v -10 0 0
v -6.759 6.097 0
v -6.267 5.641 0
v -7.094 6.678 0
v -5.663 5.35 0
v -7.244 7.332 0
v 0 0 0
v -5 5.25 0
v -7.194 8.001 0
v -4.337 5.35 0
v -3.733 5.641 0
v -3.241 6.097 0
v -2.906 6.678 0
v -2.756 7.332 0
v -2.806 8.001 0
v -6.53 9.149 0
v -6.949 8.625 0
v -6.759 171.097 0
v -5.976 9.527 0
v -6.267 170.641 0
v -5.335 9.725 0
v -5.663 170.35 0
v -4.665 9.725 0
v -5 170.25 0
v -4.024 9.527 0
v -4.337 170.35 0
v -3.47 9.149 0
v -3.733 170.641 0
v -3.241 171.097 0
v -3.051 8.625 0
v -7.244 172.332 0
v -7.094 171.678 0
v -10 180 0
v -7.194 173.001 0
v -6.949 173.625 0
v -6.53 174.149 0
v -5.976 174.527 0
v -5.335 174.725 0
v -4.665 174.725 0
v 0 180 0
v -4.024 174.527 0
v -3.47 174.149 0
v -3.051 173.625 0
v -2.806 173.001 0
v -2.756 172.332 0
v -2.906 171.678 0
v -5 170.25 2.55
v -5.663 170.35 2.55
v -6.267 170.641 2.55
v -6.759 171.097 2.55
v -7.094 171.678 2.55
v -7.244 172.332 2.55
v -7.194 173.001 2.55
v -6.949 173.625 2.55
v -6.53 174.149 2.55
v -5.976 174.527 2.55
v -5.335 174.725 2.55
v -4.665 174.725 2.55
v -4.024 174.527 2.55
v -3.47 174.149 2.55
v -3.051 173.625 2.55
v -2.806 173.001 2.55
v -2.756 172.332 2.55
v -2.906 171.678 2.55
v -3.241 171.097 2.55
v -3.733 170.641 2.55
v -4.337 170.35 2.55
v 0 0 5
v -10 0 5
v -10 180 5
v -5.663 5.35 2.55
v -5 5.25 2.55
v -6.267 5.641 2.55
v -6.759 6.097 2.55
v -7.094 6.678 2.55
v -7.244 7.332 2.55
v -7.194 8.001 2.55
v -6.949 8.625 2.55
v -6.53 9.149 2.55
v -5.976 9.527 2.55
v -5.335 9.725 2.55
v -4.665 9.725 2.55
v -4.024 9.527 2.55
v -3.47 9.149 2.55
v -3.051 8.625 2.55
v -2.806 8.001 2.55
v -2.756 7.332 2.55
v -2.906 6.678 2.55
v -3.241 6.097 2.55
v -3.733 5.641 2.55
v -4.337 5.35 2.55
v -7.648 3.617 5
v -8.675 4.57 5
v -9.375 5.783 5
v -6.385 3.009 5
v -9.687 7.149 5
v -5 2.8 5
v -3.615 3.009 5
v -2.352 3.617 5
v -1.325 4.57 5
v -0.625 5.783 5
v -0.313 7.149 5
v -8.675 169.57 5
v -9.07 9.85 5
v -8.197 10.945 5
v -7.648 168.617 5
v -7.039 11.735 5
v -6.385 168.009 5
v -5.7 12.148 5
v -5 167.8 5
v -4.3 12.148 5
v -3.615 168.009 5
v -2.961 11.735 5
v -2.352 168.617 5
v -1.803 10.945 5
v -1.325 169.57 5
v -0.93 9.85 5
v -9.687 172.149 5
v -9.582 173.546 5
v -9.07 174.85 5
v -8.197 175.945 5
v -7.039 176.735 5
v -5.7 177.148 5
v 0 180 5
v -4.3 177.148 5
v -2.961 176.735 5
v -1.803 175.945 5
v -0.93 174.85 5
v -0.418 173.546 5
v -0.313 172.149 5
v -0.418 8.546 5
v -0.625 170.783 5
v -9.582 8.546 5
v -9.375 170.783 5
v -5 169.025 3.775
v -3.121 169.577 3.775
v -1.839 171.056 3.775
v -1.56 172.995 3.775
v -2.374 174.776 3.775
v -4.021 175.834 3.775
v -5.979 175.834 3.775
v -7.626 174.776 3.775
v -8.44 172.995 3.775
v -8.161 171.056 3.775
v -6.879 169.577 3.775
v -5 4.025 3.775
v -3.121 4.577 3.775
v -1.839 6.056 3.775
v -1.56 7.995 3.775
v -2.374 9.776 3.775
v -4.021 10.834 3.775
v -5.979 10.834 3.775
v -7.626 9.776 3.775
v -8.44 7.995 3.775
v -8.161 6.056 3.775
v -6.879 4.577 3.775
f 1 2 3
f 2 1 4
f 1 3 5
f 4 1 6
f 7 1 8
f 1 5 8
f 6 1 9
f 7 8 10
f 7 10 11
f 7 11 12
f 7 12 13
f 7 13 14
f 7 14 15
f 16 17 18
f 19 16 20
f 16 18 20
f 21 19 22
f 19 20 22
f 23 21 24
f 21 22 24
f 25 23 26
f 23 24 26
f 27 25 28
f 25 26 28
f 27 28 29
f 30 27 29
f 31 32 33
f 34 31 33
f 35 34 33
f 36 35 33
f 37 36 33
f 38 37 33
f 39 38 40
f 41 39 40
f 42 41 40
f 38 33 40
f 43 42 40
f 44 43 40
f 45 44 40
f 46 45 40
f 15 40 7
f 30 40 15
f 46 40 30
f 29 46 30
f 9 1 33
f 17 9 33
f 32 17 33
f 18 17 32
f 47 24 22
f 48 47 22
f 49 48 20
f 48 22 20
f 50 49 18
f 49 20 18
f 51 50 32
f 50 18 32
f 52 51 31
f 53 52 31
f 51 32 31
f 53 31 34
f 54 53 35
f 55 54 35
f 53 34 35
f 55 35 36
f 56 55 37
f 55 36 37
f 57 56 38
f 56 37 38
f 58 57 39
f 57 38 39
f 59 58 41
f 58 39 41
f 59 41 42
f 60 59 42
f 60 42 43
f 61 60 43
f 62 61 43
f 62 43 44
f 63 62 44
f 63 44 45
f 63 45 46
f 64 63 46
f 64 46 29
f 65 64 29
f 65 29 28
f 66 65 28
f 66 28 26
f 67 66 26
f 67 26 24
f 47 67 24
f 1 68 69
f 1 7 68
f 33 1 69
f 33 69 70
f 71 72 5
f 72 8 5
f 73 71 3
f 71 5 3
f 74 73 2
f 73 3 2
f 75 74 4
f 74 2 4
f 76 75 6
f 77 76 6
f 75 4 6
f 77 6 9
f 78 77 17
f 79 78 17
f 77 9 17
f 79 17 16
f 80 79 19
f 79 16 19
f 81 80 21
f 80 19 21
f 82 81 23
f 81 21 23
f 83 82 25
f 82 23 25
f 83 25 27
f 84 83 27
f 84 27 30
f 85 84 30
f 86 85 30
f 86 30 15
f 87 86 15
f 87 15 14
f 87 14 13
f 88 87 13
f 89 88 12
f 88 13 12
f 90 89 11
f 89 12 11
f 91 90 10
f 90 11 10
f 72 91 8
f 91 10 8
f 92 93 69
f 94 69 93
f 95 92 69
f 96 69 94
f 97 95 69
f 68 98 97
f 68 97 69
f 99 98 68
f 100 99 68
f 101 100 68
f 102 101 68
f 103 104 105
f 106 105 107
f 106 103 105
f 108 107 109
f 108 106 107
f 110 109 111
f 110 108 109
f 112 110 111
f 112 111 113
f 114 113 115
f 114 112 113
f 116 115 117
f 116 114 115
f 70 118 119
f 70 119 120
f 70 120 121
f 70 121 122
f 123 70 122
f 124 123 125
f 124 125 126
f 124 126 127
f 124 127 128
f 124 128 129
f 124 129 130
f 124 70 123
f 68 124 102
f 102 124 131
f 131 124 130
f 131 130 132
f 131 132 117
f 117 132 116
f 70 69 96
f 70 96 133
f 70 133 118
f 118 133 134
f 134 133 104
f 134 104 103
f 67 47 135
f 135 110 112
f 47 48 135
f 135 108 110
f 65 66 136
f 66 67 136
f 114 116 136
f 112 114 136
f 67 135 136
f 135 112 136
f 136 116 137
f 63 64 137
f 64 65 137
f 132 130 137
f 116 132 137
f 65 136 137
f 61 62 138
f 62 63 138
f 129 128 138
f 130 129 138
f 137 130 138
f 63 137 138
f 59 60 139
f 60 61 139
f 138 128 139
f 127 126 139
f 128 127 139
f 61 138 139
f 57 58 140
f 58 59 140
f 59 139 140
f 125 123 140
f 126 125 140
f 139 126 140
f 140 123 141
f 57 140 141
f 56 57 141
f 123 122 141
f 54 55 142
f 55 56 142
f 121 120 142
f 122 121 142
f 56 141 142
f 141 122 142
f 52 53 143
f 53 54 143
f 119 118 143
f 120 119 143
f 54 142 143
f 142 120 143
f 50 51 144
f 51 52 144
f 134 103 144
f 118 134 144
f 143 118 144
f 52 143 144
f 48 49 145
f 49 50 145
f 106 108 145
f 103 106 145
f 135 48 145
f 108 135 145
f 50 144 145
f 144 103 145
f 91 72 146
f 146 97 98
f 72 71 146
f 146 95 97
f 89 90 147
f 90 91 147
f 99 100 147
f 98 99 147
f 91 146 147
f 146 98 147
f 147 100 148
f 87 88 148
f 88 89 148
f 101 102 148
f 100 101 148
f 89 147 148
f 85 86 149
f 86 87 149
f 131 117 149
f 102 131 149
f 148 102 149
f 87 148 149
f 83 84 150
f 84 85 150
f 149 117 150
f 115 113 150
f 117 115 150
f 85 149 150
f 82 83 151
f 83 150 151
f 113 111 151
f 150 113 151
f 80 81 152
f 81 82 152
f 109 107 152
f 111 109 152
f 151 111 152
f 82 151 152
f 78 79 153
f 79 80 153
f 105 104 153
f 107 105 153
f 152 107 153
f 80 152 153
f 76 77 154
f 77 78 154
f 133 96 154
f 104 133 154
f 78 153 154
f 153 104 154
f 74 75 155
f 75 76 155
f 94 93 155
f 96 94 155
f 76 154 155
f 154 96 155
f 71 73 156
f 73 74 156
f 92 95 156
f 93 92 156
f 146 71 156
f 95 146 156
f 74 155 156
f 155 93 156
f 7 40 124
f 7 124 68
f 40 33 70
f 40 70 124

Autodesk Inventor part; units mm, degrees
ref_plane "YZ Plane" through (0, 0, 0) normal (1, 0, 0) x (0, 1, 0)
ref_plane "XZ Plane" through (0, 0, 0) normal (0, 1, 0) x (-1, 0, 0)
ref_plane "XY Plane" through (0, 0, 0) normal (0, 0, 1) x (1, 0, 0)
sketch "Sketch1" plane through (0, 0, 0) normal (0, 0, 1) x (1, 0, 0)
  line L0 (0, 0) -> (-10, 0)
  line L1 (-10, 0) -> (-10, 180)
  line L2 (-10, 180) -> (0, 180)
  line L3 (0, 180) -> (0, 0)
  dimension "d0" = 10
  dimension "d1" = 180
extrude "Extrusion1" add sketch "Sketch1" along normal blind 5
sketch "Sketch2" plane through (0, 0, 5) normal (0, 0, 1) x (1, 0, 0)
  line L0 (0, 180) -> (-10, 180) projected
  line L1 (-10, 0) -> (0, 0) projected
  line L2 (-10, 180) -> (-10, 0) projected
  line L3 (0, 0) -> (0, 180) projected
  point P0 (-5, 172.5)
  point P1 (-5, 7.5)
  dimension "d4" = 7.5
  dimension "d5" = 7.5
  dimension "d8" = 5
  dimension "d9" = 5
hole "Hole1" at (-5, 172.5, 5) at (-5, 7.5, 5) direction (0, 0, -1) diameter 4.5 end through all countersink diameter 9.4 countersink angle 90 clearance for "Flat Head Machine Screw" size "M4" standard "Ansi Metric M Profile"
equation "\"d5\" = d4"
equation "\"d8\" = d9"
properties part number "Pancake_Exit Piece" material "Wood (Birch)"
